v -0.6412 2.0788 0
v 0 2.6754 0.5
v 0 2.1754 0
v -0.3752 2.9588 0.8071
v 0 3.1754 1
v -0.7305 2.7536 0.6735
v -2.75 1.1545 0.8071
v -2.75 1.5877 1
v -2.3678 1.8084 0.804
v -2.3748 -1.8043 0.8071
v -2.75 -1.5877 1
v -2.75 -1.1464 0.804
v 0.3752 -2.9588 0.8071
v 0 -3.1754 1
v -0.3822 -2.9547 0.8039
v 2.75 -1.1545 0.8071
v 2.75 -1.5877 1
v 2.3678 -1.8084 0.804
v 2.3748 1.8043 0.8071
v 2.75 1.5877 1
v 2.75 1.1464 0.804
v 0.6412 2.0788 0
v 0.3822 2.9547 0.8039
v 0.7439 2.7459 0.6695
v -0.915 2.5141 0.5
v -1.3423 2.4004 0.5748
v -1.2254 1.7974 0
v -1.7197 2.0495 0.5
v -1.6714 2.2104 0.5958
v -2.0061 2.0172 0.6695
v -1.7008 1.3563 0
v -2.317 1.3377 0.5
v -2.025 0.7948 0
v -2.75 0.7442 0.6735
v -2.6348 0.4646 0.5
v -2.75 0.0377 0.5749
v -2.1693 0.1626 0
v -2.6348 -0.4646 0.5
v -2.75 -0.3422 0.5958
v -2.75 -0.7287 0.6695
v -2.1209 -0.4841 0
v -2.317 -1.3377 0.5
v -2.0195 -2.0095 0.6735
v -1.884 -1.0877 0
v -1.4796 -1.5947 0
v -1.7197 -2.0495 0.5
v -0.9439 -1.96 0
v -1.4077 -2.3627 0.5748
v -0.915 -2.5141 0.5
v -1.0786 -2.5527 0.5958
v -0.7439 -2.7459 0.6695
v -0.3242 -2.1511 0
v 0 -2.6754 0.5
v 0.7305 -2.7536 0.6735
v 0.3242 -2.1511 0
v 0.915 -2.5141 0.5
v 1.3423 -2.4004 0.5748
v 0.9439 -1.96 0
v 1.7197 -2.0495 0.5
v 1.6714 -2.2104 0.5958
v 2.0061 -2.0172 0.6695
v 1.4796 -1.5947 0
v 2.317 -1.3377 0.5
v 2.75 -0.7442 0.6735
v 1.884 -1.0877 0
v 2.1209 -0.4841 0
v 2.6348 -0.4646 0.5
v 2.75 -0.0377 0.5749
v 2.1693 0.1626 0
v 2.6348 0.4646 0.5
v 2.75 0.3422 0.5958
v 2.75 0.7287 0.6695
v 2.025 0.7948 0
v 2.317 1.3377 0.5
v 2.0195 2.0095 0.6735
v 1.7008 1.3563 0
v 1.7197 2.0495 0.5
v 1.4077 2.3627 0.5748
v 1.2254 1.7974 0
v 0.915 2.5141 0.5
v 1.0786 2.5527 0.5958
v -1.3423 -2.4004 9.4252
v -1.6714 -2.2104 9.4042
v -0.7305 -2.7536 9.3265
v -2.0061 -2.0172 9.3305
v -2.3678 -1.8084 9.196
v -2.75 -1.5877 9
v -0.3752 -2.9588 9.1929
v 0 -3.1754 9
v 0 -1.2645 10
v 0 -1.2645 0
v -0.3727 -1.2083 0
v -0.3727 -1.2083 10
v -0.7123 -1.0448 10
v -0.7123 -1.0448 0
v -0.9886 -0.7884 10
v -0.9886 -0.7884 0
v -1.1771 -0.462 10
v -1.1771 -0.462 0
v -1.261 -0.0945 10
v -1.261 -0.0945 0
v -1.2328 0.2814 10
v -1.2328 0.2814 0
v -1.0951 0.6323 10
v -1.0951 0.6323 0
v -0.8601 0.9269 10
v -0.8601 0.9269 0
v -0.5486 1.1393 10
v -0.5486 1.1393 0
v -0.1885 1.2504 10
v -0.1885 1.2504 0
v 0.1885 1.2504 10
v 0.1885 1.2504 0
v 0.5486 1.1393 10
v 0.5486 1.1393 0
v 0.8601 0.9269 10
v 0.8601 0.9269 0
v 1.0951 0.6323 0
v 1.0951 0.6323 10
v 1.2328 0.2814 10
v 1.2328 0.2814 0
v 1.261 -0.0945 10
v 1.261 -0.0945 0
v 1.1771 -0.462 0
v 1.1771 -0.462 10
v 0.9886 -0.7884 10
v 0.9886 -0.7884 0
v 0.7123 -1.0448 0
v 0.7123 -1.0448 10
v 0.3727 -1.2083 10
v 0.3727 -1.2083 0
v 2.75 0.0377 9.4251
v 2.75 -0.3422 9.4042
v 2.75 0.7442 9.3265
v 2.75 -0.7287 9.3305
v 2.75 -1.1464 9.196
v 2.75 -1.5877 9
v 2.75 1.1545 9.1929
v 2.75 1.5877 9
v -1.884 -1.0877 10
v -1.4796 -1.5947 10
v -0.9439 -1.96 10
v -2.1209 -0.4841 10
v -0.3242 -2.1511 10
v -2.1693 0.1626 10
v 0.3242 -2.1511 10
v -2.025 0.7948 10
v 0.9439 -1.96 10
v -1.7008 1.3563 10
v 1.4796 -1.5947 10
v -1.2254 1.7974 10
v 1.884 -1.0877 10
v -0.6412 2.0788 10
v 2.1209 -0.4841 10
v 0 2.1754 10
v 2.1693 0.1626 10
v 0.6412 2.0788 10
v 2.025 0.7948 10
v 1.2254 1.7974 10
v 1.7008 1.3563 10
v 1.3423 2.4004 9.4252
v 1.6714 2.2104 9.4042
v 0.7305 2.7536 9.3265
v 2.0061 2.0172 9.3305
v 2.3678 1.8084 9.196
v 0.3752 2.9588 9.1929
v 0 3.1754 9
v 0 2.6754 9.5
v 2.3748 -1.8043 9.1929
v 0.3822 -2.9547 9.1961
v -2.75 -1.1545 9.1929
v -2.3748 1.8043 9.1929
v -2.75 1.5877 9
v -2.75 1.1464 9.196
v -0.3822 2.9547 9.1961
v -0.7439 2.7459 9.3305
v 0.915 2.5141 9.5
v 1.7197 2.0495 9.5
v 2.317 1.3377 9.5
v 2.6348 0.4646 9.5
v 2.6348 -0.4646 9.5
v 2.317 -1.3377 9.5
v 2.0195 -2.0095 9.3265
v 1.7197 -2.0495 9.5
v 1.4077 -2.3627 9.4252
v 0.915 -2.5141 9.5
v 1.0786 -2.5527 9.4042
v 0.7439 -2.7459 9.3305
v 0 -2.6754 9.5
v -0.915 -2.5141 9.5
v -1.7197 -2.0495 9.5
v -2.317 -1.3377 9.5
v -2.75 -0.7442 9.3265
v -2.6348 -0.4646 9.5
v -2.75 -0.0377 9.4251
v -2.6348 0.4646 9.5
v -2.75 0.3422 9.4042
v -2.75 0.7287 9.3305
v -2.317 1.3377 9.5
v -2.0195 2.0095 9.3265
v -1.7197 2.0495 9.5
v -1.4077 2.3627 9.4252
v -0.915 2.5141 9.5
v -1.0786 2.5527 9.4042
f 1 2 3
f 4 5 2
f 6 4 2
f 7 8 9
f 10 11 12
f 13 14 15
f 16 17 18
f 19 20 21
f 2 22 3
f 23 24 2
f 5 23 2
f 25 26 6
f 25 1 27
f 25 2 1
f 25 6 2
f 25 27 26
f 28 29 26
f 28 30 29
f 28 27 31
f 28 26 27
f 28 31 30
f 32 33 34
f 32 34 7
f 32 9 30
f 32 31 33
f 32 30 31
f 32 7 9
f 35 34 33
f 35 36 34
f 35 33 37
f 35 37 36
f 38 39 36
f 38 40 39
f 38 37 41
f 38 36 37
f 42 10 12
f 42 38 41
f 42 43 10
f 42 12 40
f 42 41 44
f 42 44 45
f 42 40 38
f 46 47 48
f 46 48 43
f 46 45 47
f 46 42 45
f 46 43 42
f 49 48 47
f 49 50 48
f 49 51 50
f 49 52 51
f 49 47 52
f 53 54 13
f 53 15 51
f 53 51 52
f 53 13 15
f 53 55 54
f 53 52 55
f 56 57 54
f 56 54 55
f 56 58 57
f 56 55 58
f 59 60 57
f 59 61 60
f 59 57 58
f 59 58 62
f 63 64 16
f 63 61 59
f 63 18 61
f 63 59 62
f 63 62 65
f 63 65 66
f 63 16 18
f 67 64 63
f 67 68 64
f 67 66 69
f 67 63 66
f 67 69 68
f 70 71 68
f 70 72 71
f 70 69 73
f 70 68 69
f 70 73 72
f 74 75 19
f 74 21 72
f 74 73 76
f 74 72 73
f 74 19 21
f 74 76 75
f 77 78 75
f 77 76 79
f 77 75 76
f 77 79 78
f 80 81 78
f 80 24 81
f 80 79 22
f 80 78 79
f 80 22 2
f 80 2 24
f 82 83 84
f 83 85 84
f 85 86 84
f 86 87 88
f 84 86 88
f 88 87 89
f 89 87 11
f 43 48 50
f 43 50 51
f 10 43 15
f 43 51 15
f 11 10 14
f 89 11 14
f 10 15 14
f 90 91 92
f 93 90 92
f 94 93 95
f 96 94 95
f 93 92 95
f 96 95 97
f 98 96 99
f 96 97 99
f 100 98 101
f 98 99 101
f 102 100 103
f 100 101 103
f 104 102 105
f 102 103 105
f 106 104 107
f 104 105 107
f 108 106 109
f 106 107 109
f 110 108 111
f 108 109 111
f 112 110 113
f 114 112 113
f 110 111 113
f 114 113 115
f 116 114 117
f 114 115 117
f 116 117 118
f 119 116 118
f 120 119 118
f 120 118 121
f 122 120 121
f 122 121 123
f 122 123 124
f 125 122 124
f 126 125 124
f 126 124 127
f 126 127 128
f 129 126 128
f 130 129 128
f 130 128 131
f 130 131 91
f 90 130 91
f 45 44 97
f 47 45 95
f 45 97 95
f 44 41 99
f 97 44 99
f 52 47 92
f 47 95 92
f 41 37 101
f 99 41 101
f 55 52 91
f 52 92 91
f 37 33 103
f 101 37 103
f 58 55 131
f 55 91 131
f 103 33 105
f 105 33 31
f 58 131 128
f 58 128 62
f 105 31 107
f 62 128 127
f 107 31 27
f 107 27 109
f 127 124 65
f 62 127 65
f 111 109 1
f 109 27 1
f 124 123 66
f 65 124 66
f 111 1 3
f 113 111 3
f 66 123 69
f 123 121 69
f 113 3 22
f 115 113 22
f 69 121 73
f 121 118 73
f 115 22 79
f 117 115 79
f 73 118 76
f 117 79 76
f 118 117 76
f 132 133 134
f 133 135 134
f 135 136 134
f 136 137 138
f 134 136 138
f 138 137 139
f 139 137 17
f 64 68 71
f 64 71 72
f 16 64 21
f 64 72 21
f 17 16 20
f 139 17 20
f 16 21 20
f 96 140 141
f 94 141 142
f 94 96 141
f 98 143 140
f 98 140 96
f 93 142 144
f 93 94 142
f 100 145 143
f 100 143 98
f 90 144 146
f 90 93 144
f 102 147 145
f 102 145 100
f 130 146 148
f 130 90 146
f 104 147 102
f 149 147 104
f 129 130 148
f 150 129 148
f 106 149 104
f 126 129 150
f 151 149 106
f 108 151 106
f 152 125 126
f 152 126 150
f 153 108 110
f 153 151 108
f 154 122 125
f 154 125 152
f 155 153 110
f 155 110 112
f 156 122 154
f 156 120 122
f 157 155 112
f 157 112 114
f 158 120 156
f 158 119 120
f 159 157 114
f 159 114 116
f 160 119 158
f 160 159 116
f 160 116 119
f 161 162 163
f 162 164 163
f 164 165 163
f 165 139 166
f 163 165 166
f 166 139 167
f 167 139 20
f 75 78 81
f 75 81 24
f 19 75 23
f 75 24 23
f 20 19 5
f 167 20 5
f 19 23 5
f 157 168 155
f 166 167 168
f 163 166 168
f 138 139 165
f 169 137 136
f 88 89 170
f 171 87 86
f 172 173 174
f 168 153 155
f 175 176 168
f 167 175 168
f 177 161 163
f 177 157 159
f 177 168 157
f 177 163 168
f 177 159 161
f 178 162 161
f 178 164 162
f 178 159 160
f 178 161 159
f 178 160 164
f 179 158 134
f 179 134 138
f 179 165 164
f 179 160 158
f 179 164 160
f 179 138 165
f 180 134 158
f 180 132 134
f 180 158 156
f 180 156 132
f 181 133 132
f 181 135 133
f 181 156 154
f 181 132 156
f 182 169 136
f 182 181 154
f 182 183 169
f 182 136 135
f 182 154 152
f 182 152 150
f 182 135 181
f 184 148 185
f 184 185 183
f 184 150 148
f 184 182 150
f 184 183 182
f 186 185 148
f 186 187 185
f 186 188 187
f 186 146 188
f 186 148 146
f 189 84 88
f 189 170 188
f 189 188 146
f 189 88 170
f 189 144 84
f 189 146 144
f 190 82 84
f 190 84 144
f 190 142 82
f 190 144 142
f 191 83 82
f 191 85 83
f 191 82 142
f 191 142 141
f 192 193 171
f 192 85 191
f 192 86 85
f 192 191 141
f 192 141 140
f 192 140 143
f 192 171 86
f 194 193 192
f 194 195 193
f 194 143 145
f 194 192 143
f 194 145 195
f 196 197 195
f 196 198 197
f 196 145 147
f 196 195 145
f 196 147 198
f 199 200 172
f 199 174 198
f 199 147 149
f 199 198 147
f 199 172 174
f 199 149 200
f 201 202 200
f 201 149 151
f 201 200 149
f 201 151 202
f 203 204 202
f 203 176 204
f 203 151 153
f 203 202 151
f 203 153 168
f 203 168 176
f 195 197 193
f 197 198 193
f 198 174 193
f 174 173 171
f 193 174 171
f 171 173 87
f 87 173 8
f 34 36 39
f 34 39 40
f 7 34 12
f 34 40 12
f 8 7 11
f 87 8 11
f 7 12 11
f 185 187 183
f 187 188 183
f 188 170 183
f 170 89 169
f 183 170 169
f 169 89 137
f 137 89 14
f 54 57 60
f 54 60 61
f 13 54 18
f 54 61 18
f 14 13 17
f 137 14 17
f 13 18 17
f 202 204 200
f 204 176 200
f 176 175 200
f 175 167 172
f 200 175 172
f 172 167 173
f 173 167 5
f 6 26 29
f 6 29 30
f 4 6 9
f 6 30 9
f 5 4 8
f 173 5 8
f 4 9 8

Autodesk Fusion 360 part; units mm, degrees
sketch "Skizze1" plane through (0, 0, 0) normal (0, 0, 1) x (1, 0, 0)
  line L0 (2.75, 1.5877) -> (0, 3.1754)
  line L1 (0, 3.1754) -> (-2.75, 1.5877)
  line L2 (-2.75, 1.5877) -> (-2.75, -1.5877)
  line L3 (-2.75, -1.5877) -> (0, -3.1754)
  line L4 (0, -3.1754) -> (2.75, -1.5877)
  line L5 (2.75, -1.5877) -> (2.75, 1.5877)
  dimension "d1" = 5.5
extrude "Extrusion1" add sketch "Skizze1" along normal blind 10
sketch "Skizze2" plane through (0, 0, 0) normal (1, 0, 0) x (0, 0, -1)
  line L0 (-10, 1.5877) -> (-10, 3.1754)
  line L1 (0, 1.5877) -> (0, 3.1754)
  line L2 (0, 3.1754) -> (-10, 3.1754)
  line L3 (2, 0.1754) -> (-1.5, 3.6754)
  line L4 (-1.5, 3.6754) -> (2, 3.6754)
  line L5 (2, 3.6754) -> (2, 0.1754)
  line L6 (-8.5, 3.6754) -> (-12, 3.6754)
  line L7 (-12, 3.6754) -> (-12, 0.1754)
  line L8 (-12, 0.1754) -> (-8.5, 3.6754)
  dimension "d4" = 45
  dimension "d5" = 45
  dimension "d6" = 2
  dimension "d7" = 2
  dimension "d8" = 3.5
  dimension "d9" = 0.5
revolve "Drehen1" cut sketch "Skizze2" angle 360 about axis through (0, 0, 1.75) along (0, 0, 1)
hole "Bohrung1" at (0, 0, 10) direction (0, 0, -1) diameter 2.529 end through all
